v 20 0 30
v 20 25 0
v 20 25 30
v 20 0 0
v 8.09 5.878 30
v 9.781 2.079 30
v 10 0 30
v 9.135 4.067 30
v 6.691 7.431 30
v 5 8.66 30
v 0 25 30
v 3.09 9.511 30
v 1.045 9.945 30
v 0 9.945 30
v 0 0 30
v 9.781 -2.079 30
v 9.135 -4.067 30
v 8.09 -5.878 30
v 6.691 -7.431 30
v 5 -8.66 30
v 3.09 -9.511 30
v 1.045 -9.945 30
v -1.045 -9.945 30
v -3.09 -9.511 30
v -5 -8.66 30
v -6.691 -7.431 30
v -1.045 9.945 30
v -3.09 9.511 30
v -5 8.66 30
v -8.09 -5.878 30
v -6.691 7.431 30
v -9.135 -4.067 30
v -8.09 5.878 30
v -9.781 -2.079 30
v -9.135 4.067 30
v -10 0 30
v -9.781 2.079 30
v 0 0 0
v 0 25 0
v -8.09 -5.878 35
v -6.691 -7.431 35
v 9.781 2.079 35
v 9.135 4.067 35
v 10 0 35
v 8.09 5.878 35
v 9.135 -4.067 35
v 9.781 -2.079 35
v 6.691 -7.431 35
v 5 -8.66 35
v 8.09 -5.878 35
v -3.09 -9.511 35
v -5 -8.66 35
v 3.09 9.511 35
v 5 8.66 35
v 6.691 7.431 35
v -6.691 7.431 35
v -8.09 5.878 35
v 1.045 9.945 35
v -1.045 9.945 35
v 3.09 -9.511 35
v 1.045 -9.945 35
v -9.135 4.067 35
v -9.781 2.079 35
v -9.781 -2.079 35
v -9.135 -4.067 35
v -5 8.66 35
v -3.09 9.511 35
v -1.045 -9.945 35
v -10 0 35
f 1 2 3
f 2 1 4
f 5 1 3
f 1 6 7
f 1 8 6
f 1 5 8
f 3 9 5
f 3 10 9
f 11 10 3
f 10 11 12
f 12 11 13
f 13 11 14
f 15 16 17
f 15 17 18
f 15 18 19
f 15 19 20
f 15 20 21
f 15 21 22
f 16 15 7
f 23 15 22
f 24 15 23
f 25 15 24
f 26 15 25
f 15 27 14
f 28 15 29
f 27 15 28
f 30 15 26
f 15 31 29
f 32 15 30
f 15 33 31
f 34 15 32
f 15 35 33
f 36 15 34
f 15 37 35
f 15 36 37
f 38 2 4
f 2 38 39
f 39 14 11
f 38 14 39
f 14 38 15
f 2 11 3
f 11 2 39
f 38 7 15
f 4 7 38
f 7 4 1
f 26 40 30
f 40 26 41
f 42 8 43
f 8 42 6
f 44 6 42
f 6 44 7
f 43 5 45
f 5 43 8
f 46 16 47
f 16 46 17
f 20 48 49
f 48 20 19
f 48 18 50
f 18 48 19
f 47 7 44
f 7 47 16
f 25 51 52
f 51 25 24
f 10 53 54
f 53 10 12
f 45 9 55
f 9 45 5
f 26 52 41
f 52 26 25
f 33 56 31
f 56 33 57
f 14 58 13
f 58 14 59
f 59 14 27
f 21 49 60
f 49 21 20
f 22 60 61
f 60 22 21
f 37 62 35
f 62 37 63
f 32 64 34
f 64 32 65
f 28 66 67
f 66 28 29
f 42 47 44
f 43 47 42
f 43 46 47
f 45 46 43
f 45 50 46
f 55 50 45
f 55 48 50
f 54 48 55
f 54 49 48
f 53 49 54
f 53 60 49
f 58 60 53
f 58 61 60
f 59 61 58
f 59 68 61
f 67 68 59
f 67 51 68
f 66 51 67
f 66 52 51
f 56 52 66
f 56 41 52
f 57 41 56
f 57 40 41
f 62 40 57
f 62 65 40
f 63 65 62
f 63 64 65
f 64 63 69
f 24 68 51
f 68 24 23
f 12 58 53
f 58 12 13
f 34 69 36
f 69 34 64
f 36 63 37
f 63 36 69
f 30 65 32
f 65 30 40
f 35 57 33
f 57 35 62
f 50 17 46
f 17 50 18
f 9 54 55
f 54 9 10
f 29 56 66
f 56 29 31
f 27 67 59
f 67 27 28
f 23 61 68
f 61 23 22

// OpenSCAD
// Box with all magic numbers inlined (negative case)
// The parameter-block step must convert these to named parameters.
cube([20, 25, 30]);
translate([0, 0, 30])
cylinder(h=5, d=20);
